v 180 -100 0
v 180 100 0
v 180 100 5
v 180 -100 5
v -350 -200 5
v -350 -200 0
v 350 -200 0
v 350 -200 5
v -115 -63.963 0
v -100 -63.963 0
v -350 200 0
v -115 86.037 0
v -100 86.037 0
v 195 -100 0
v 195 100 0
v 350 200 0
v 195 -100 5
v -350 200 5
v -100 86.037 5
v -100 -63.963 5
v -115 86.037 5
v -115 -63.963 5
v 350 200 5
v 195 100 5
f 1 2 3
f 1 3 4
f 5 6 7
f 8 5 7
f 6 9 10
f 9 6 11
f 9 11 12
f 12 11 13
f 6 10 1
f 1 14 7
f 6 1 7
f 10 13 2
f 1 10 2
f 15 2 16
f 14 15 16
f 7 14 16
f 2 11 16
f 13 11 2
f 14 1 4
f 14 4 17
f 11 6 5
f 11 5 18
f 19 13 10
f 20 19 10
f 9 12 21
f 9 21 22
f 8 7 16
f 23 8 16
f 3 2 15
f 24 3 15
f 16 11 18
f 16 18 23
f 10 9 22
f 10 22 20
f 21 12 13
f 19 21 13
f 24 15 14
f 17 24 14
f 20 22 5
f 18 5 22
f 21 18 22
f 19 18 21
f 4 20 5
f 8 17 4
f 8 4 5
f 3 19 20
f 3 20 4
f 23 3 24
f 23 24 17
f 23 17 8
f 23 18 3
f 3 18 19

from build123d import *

# Parameters (mm, degrees)
F0_W     = 700
F0_H     = 400
F1_DEPTH = 5
F2_W     = 15
F2_H     = 200
F2_H_2   = 150
F3_DEPTH = 25


with BuildPart() as f1:
    # F0 (on Top) → F1 (new body)
    with BuildSketch(Plane.XY):
        Rectangle(F0_W, F0_H)
    extrude(amount=F1_DEPTH)

    # F2 (on face) → F3 (cut)
    with BuildSketch(Plane(origin=(0, 0, 0), x_dir=(1, 0, 0), z_dir=(0, 0, -1))):
        with Locations((187.5, 0)):
            Rectangle(F2_W, F2_H)
        with Locations((-107.5, -11.036794)):
            Rectangle(F2_W, F2_H_2)
    extrude(amount=-F3_DEPTH, mode=Mode.SUBTRACT)


solid = f1.part
